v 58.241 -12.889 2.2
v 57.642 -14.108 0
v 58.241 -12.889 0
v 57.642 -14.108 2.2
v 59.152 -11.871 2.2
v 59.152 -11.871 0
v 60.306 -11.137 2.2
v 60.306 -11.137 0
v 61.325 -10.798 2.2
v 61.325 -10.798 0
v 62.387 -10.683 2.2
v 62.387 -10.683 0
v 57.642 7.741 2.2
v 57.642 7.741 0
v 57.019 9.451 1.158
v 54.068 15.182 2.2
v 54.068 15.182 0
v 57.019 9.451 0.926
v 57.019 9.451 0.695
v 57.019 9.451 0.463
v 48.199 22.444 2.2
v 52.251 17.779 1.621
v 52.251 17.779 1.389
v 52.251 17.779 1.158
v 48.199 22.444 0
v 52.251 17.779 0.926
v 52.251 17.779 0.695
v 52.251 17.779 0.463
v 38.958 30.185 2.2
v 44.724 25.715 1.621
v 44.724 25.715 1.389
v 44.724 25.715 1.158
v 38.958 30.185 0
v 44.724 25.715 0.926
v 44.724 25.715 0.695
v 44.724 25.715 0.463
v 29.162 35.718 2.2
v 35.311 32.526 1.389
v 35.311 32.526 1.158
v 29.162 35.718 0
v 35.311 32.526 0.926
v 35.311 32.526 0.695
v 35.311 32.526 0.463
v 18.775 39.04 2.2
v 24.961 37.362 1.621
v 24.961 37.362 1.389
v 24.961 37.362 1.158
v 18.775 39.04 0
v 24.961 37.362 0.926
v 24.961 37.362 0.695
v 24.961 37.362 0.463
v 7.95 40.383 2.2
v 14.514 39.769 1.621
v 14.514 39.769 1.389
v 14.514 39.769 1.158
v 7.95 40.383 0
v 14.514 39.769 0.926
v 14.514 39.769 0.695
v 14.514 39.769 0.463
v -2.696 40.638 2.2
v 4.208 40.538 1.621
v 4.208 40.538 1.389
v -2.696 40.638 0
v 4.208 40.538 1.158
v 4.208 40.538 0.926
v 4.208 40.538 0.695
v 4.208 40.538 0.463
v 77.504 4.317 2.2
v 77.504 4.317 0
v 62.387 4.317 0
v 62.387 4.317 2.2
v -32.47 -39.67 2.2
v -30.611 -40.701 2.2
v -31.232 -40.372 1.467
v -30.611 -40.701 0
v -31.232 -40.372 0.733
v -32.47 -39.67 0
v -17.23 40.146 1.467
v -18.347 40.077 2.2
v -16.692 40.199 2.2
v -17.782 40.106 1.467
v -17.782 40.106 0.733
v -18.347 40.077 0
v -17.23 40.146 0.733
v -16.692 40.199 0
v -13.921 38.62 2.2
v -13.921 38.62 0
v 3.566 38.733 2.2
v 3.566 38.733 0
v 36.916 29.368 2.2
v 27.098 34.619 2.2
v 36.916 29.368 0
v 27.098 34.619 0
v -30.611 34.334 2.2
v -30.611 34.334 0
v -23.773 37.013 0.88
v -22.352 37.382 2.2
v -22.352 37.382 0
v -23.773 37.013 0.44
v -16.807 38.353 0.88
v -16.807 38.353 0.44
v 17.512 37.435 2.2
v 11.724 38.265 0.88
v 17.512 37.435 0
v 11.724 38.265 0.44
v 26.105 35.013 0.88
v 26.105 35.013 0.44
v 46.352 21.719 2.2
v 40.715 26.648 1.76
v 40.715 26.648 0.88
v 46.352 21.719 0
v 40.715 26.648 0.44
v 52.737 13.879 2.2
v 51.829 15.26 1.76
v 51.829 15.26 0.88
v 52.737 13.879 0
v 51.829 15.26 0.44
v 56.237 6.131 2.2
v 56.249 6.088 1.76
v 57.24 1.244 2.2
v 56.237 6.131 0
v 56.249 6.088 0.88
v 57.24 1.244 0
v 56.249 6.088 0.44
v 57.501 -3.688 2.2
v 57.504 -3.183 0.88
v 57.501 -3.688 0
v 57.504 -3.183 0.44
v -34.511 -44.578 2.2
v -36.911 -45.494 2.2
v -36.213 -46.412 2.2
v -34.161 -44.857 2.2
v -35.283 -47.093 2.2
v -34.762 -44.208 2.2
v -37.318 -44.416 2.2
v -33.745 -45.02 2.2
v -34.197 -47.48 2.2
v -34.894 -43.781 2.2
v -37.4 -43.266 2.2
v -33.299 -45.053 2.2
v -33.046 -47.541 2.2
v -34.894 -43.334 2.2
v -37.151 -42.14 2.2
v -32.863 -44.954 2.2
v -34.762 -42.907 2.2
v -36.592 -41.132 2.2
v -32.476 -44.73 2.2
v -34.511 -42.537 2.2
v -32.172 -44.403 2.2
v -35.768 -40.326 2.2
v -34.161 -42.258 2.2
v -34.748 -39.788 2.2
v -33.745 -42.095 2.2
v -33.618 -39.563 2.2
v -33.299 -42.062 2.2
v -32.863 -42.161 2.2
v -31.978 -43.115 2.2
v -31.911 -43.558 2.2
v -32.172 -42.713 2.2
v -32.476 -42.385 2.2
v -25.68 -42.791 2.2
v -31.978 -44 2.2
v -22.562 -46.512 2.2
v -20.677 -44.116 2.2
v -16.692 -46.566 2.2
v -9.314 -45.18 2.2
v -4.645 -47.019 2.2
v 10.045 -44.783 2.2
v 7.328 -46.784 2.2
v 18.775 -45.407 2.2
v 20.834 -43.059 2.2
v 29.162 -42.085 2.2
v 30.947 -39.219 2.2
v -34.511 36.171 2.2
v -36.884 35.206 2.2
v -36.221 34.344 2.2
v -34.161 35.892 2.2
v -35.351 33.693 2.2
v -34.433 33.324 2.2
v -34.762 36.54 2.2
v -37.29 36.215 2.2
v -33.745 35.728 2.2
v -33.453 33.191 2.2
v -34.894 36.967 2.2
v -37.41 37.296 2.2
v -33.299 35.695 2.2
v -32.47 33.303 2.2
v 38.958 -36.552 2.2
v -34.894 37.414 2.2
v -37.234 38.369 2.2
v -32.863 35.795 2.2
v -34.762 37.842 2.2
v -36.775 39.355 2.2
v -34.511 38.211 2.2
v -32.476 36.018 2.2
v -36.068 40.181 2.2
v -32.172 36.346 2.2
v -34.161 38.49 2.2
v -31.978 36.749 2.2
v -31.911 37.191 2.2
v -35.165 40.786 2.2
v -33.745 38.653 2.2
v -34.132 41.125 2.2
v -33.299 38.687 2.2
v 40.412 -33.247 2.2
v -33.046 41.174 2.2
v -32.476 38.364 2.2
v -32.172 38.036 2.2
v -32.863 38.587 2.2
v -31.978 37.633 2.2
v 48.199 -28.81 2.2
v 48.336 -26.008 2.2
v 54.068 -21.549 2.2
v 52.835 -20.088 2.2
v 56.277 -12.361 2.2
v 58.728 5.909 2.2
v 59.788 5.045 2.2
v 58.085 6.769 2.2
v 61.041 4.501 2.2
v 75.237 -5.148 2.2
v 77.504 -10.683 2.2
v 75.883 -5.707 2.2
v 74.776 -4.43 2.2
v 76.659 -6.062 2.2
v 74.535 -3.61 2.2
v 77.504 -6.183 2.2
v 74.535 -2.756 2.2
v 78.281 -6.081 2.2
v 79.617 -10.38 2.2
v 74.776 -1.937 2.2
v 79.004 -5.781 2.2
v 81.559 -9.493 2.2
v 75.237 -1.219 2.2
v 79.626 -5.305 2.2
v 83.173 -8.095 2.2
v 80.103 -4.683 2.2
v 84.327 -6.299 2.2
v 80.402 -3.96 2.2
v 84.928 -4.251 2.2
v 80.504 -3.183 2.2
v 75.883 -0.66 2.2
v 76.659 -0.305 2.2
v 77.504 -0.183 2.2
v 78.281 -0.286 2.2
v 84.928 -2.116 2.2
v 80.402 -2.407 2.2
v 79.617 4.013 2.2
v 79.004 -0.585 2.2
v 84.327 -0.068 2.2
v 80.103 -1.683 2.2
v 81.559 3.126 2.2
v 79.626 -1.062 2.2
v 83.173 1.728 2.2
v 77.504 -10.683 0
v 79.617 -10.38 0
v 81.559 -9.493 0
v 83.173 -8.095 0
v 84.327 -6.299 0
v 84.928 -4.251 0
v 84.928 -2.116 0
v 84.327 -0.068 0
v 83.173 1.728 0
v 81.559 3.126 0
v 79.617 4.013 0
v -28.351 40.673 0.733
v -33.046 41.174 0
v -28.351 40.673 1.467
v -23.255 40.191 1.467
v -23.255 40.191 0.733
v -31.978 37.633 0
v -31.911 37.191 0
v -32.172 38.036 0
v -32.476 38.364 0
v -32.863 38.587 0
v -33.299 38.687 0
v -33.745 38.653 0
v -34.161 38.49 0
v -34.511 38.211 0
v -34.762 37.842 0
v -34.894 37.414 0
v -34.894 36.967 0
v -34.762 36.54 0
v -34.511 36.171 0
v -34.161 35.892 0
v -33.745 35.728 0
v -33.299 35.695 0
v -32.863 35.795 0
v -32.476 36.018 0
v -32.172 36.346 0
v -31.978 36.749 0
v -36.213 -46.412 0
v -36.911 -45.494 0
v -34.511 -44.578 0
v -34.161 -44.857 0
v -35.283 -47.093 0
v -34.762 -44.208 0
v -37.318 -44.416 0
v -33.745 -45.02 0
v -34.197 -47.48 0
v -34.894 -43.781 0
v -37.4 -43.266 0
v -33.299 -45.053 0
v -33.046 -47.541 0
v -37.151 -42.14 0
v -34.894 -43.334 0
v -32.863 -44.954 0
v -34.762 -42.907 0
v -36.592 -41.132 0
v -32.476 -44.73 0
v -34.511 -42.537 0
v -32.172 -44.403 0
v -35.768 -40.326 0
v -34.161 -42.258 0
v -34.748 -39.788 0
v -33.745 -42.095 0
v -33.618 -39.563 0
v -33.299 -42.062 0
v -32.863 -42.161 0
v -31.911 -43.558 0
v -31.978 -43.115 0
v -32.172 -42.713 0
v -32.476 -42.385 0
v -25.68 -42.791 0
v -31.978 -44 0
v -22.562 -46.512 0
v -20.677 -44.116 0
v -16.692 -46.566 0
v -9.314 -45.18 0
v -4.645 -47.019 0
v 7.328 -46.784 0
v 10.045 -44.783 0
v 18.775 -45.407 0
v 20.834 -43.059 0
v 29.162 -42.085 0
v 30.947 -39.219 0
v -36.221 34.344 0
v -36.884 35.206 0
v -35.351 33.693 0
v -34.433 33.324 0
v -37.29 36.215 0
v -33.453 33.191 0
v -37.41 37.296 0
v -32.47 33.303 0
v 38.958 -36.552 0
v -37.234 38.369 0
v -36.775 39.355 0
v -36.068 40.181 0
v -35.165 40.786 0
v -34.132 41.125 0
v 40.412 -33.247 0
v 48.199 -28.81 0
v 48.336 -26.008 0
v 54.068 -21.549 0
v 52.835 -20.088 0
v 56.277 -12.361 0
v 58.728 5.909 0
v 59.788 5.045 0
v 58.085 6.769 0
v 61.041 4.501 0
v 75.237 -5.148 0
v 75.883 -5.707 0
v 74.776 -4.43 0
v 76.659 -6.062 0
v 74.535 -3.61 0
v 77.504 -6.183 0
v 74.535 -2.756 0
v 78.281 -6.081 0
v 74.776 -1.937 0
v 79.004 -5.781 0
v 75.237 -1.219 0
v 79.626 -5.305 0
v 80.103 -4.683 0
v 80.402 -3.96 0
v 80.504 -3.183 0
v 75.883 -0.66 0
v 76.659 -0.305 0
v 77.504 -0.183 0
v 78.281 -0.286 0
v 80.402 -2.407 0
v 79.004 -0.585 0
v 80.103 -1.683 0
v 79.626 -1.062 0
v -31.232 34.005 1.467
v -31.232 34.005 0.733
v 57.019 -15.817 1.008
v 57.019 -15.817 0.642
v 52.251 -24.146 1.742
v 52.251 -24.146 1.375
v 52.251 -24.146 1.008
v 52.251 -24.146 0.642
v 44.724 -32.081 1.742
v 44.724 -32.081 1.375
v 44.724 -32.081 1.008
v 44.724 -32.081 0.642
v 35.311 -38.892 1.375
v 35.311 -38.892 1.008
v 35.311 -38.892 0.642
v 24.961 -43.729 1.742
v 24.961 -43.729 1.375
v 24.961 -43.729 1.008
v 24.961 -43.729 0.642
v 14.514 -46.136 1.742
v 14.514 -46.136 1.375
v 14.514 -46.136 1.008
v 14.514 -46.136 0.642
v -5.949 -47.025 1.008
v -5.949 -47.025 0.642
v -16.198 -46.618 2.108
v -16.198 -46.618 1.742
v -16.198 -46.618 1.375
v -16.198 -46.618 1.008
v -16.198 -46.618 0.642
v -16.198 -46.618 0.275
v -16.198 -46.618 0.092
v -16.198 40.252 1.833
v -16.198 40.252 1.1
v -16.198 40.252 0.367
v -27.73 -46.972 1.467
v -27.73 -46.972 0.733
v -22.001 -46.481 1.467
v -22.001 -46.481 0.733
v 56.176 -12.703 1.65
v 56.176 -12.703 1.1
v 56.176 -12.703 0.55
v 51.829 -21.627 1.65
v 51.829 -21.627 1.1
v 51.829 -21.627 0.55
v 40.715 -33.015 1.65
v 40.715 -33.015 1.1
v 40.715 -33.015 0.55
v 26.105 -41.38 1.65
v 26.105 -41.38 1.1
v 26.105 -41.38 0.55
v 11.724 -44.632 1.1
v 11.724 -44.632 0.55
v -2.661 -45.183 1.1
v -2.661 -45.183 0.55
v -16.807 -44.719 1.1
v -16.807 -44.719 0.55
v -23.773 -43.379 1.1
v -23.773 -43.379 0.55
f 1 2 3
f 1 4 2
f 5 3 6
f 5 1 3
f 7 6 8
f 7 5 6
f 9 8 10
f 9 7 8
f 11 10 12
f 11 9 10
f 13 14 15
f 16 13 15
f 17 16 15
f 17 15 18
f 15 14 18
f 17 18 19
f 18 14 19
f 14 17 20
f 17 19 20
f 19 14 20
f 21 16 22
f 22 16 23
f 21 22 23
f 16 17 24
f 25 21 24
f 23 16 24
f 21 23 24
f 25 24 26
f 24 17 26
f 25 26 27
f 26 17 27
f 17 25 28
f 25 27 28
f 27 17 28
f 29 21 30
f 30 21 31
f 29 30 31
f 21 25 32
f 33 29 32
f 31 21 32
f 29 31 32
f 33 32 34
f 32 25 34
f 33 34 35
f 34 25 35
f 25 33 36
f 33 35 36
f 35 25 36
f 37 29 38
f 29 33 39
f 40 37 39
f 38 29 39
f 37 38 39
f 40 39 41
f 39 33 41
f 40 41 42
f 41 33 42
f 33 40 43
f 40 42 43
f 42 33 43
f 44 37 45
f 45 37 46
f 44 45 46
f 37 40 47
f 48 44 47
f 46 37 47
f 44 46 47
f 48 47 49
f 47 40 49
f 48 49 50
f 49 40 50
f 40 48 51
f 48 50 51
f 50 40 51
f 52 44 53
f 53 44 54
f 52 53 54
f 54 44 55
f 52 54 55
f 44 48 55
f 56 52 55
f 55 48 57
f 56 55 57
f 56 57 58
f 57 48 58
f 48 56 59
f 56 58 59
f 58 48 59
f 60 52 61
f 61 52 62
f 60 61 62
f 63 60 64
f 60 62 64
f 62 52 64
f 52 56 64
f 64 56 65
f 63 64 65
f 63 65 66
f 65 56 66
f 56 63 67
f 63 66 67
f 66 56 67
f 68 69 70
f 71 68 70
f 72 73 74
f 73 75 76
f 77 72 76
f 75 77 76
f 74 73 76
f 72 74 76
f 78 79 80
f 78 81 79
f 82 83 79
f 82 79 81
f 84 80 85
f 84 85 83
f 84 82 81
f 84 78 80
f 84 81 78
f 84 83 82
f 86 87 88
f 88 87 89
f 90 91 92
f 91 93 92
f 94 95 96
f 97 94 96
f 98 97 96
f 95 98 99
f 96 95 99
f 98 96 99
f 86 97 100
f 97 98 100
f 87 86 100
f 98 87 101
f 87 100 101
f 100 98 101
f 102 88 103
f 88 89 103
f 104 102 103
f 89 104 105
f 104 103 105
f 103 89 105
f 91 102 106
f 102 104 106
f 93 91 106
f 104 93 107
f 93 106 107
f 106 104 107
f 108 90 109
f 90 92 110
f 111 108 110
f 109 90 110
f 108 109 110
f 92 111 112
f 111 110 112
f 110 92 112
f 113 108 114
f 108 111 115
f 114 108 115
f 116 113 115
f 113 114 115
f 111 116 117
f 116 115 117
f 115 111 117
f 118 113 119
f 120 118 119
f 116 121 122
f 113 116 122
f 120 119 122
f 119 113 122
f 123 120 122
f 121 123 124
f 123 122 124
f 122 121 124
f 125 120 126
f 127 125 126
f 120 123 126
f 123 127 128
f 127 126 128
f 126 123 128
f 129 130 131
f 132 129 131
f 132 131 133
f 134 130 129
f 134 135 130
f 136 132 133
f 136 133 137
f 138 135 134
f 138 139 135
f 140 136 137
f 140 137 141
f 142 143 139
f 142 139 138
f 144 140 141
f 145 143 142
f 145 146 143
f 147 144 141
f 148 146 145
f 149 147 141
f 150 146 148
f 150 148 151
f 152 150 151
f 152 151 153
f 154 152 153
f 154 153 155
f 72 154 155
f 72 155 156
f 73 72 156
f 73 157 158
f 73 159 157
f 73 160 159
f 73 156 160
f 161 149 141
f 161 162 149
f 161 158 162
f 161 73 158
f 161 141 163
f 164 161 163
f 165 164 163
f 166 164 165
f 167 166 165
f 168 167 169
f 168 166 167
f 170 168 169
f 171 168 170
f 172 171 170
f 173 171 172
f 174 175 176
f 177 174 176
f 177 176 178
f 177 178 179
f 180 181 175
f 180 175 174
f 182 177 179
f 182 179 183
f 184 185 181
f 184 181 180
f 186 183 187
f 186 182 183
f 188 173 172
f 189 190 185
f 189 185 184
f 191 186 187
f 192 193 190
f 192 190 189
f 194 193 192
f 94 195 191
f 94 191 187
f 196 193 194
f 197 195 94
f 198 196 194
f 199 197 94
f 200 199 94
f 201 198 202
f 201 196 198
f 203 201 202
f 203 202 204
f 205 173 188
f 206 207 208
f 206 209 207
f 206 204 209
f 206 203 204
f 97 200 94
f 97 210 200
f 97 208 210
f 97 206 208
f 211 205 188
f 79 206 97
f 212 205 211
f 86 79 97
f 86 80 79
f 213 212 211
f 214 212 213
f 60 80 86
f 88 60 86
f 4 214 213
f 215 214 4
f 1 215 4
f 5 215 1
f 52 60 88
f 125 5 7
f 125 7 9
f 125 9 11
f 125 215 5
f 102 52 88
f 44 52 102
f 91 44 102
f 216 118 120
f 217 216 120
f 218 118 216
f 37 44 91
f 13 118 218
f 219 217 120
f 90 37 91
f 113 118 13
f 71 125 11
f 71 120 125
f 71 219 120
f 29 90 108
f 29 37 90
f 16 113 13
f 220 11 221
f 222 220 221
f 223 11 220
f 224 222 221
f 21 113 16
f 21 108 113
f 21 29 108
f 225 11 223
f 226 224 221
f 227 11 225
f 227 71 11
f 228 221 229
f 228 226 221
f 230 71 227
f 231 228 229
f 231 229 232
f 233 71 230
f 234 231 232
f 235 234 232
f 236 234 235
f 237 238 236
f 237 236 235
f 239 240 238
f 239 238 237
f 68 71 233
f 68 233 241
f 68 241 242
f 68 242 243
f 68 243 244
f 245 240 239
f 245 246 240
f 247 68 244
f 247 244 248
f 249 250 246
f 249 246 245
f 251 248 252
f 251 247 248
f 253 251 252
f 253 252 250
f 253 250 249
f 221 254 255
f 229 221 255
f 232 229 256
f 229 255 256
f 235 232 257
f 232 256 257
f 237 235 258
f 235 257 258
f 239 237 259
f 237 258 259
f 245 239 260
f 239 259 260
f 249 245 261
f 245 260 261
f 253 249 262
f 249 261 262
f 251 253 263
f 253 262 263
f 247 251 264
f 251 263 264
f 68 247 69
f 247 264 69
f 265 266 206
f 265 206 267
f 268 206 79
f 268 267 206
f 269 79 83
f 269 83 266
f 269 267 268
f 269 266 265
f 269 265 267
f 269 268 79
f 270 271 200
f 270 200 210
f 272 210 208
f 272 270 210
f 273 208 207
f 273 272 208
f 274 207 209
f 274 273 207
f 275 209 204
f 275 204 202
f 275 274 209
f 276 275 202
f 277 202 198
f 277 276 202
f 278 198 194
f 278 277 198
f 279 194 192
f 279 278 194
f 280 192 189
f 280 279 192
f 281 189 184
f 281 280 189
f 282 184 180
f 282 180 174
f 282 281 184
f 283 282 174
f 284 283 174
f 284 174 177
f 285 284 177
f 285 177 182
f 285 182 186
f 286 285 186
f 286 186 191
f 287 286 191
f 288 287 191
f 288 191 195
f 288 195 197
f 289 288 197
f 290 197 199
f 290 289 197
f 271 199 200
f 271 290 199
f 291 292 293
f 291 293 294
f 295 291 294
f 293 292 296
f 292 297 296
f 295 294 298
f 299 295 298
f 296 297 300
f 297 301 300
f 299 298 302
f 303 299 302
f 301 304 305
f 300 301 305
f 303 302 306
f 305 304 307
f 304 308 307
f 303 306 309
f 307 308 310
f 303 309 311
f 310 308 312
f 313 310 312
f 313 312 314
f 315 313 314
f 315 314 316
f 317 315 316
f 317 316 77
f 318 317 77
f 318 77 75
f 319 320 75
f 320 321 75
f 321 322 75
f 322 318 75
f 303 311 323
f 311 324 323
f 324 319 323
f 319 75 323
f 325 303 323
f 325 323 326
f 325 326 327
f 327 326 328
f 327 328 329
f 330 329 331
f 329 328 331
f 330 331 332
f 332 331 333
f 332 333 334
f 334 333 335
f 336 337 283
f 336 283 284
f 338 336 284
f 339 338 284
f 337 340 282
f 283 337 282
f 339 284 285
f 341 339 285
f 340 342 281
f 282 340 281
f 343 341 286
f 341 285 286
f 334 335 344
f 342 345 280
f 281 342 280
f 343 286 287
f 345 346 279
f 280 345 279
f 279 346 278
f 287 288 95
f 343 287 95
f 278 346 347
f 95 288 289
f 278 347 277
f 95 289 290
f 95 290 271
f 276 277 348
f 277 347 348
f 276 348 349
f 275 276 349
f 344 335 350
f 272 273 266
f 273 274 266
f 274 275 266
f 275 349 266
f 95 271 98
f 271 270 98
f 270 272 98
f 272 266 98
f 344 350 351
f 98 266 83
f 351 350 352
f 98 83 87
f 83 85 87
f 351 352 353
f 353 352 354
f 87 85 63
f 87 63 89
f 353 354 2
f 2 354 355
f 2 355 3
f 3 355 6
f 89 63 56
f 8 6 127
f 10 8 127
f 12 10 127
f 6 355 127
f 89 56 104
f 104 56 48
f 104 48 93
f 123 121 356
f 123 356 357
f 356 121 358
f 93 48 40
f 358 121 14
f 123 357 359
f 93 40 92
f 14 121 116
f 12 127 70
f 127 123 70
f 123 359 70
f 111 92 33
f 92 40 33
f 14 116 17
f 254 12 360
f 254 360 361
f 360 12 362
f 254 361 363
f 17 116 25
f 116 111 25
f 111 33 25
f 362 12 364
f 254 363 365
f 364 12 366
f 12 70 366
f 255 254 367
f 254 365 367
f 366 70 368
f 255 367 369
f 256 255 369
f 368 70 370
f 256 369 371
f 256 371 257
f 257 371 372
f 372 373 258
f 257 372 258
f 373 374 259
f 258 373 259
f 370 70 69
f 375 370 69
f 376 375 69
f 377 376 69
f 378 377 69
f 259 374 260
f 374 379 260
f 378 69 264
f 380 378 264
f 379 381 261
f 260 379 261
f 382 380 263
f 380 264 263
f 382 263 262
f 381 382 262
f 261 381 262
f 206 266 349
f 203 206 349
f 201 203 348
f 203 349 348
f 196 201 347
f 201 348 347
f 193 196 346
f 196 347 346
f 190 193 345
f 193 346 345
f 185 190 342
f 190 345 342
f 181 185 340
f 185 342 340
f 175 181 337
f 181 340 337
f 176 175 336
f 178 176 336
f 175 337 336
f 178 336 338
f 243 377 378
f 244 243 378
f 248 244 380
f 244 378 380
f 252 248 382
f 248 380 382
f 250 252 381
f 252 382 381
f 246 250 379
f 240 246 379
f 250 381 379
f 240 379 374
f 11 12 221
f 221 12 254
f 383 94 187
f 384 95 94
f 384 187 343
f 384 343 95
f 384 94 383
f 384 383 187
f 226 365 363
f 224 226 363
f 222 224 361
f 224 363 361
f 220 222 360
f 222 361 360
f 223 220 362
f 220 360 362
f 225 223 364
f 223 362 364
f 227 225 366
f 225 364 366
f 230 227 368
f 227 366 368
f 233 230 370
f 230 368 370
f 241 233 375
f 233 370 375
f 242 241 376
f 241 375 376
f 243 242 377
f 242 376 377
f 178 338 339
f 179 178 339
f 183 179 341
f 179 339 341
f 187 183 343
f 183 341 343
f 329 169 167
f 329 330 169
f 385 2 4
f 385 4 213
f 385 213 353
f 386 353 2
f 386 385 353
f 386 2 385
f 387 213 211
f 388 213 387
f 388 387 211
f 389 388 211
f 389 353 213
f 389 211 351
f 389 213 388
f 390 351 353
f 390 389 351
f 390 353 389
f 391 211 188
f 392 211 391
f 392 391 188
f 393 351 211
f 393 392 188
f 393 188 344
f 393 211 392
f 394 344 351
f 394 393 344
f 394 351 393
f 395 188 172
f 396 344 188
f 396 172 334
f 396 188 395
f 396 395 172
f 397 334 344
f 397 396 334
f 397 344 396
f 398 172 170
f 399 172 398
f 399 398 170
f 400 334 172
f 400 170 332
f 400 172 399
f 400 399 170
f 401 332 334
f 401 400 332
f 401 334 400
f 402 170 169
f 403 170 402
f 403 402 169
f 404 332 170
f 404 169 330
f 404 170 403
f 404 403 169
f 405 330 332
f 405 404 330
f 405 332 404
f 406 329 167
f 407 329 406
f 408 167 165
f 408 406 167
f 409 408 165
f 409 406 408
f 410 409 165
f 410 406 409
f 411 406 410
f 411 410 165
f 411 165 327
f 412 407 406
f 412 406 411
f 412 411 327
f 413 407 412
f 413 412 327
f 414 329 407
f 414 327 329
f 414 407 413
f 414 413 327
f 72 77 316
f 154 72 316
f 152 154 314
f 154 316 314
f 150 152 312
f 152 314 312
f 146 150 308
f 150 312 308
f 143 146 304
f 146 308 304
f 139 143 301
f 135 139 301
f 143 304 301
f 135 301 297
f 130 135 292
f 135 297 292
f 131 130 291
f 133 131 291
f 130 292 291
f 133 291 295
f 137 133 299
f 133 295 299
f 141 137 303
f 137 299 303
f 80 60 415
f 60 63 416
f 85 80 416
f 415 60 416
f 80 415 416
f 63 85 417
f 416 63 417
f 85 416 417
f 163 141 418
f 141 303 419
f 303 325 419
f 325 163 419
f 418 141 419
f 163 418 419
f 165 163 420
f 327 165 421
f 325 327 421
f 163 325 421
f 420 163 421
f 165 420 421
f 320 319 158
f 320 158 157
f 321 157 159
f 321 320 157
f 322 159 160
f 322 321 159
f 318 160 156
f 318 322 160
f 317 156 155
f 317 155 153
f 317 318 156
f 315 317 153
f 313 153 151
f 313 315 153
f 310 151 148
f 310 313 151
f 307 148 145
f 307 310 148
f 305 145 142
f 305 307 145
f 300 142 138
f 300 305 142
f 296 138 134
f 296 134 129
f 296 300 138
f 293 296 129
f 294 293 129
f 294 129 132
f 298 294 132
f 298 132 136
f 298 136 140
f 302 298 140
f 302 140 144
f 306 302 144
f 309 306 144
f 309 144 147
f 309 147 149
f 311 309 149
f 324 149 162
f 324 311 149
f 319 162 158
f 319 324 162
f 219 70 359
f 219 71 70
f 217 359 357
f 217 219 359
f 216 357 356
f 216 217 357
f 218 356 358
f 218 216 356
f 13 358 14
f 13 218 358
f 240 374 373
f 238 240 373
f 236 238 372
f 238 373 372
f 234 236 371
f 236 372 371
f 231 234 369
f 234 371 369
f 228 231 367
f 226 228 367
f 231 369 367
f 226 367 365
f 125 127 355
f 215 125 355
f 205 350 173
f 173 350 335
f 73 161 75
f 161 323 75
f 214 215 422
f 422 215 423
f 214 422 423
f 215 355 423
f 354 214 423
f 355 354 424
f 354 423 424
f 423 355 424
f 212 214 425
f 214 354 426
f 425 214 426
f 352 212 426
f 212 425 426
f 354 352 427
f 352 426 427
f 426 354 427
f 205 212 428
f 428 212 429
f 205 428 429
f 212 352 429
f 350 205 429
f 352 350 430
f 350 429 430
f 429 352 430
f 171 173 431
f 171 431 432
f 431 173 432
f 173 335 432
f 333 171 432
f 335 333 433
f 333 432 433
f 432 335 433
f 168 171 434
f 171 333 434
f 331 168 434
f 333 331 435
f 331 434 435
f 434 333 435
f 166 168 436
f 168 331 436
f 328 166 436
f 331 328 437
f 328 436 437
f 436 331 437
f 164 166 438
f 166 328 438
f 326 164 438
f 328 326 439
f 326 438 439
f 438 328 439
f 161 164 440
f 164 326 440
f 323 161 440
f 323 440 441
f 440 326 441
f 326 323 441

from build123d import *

# Parameters (mm, degrees)
F0_R     = 1.5
F1_DEPTH = 2.2
F2_R     = 5


# Not quite as in the source:
# - ends of sketch curves that miss each other by under 0.0002 mm in the source are joined
# - the dataset's text gives a spline's control points without its knots; the knots are read off the source's solid


with BuildPart() as f1:
    # F0 (on Top) → F1 (new body)
    with BuildSketch(Plane.XY):
        with BuildLine():
            add(Edge.make_bspline(
                [(-30.6111583346, -40.7008057443), (-31.233077321, -40.3790771173), (-31.8528544001, -40.0346551051), (-32.469697118, -39.6698600783)],
                knots=[0.6865550694, 0.6865550694, 0.6865550694, 0.6865550694, 0.698673585, 0.698673585, 0.698673585, 0.698673585], degree=3))
            ThreePointArc((-32.469697118, -39.6698600783), (-37.400344821, -43.2656468064), (-33.0455697059, -47.5407962381))
            add(Edge.make_bspline(
                [(-33.0455697059, -47.5407962381), (-28.2150059427, -47.0976245157), (-21.512714319, -46.0289871022), (-16.6916312134, -46.5655575872)],
                knots=[0, 0, 0, 0, 16.3829910165, 16.3829910165, 16.3829910165, 16.3829910165], degree=3))
            add(Edge.make_bspline(
                [(58.5705779891, -10.6833517733), (58.5045966245, -10.9937274451), (58.1139682264, -12.7078835649), (57.1321161632, -15.8212976201), (55.4627512009, -19.3062888881), (53.7559729129, -22.0784311932), (51.7889797877, -24.8398815578), (48.8824684734, -28.233839645), (44.8027944584, -32.1279022255), (40.2521320917, -35.7428568059), (35.3501612154, -38.9743729453), (31.0709874957, -41.2568133399), (27.5873440069, -42.7817363934), (24.0850094319, -44.0818391055), (19.7200729084, -45.2896051132), (14.5079732054, -46.2040279233), (9.333650913, -46.7087635295), (5.0560116744, -46.8940848045), (1.6559105615, -46.9634870038), (-0.8844247603, -46.9908203291), (-3.4095063019, -47.0107743311), (-5.9465324466, -47.0289364293), (-8.4959599535, -47.0211705077), (-11.9085350935, -46.9496883405), (-14.6448180595, -46.7853276586), (-16.5270909923, -46.5838707043), (-16.6916312134, -46.5655575872)],
                knots=[0.0555924477, 0.0555924477, 0.0555924477, 0.0555924477, 0.0625, 0.09375, 0.125, 0.140625, 0.15625, 0.1875, 0.21875, 0.25, 0.28125, 0.3125, 0.328125, 0.34375, 0.375, 0.40625, 0.4375, 0.46875, 0.484375, 0.5, 0.515625, 0.53125, 0.546875, 0.5625, 0.59375, 0.5967429767, 0.5967429767, 0.5967429767, 0.5967429767], degree=3))
            Line((58.5705779891, -10.6833517733), (77.5044386559, -10.6833535796))
            ThreePointArc((77.5044386559, -10.6833535796), (85.0044386559, -3.1833535796), (77.5044386559, 4.3166464204))
            Line((77.5044386559, 4.3166464204), (58.6926016813, 4.3166464204))
            add(Edge.make_bspline(
                [(59.3254850017, -3.1833535832), (60.0342853265, -2.7966780854), (58.8687853693, -1.6734940692), (59.3856047623, 0.8985285026), (58.9622009071, 3.1879456463), (58.6926016813, 4.3166464204)],
                knots=[0, 0, 0, 0, 0.0130384822, 0.0314878463, 0.049315333, 0.049315333, 0.049315333, 0.049315333], degree=3))
            add(Edge.make_bspline(
                [(57.5012365496, -3.6881837366), (58.3665907715, -3.5375700684), (58.9841699395, -3.3695529499), (59.3254850017, -3.1833535832)],
                knots=[0.9937214612, 0.9937214612, 0.9937214612, 0.9937214612, 1, 1, 1, 1], degree=3))
            add(Edge.make_bspline(
                [(57.5012365496, -3.6881837366), (57.4239325318, -9.7536818174), (53.9530648244, -23.5829729529), (26.6651894068, -45.0062374143), (-2.5492473673, -45.1539383898), (-21.5965397706, -45.3642119383), (-30.6111583346, -40.7008057443)],
                knots=[0.0039126122, 0.0039126122, 0.0039126122, 0.0039126122, 0.1450305925, 0.333052663, 0.5108990784, 0.6865550694, 0.6865550694, 0.6865550694, 0.6865550694], degree=3))
        make_face()
        with Locations((-33.4110080981, -43.5575243692)):
            Circle(F0_R, mode=Mode.SUBTRACT)
        with BuildLine():
            ThreePointArc((77.5044386559, -6.1833535796), (74.5044386559, -3.1833535796), (77.5044386559, -0.1833535796))
            ThreePointArc((77.5044386559, -0.1833535796), (79.6257589995, -1.062033236), (80.5044386559, -3.1833535796))
            ThreePointArc((80.5044386559, -3.1833535796), (79.6257589995, -5.3046739232), (77.5044386559, -6.1833535796))
        make_face(mode=Mode.SUBTRACT)
        with BuildLine():
            ThreePointArc((-35.3506780872, 33.692577605), (-33.9468187682, 33.2268662862), (-32.469697118, 33.3031529191))
            add(Edge.make_bspline(
                [(-30.6111583346, 34.3340985851), (-31.233077321, 34.0123699581), (-31.8528544001, 33.6679479459), (-32.469697118, 33.3031529191)],
                knots=[0.6865550694, 0.6865550694, 0.6865550694, 0.6865550694, 0.698673585, 0.698673585, 0.698673585, 0.698673585], degree=3))
            add(Edge.make_bspline(
                [(57.5044386559, -3.1833535796), (57.5044386559, 3.0581977794), (54.1636559986, 17.0509341089), (26.6651894068, 38.6395302551), (-2.5492473673, 38.7872312306), (-21.5965397706, 38.9975047791), (-30.6111583346, 34.3340985851)],
                knots=[0, 0, 0, 0, 0.1450305925, 0.333052663, 0.5108990784, 0.6865550694, 0.6865550694, 0.6865550694, 0.6865550694], degree=3))
            add(Edge.make_bspline(
                [(57.5044386559, -3.1833535796), (57.5044386559, -3.3517371584), (57.5033798672, -3.5200128066), (57.5012365496, -3.6881837366)],
                knots=[0, 0, 0, 0, 0.0039126122, 0.0039126122, 0.0039126122, 0.0039126122], degree=3))
            add(Edge.make_bspline(
                [(57.5012365496, -3.6881837366), (58.3665907715, -3.5375700684), (58.9841699395, -3.3695529499), (59.3254850017, -3.1833535832)],
                knots=[0.9937214612, 0.9937214612, 0.9937214612, 0.9937214612, 1, 1, 1, 1], degree=3))
            add(Edge.make_bspline(
                [(59.3254850017, -3.1833535832), (60.0342853265, -2.7966780854), (58.8687853693, -1.6734940692), (59.3856047623, 0.8985285026), (58.9622009071, 3.1879456463), (58.6926016813, 4.3166464204)],
                knots=[0, 0, 0, 0, 0.0130384822, 0.0314878463, 0.049315333, 0.049315333, 0.049315333, 0.049315333], degree=3))
            Line((58.6926016813, 4.3166464204), (58.5705864982, 4.3166464204))
            add(Edge.make_bspline(
                [(58.5705864982, 4.3166464204), (58.5045966245, 4.6270202787), (58.1139682264, 6.3411763984), (57.1321161632, 9.4545904537), (55.4627512009, 12.9395817217), (53.7559729129, 15.7117240268), (51.7889797877, 18.4731743913), (48.8824684734, 21.8671324785), (44.8027944584, 25.7611950591), (40.2521320917, 29.3761496394), (35.3501612154, 32.6076657789), (31.0709874957, 34.8901061735), (27.5873440069, 36.4150292269), (24.0850094319, 37.7151319391), (19.7200729084, 38.9228979468), (14.5079732054, 39.8373207569), (9.333650913, 40.3420563631), (5.0560116744, 40.5273776381), (1.6559105615, 40.5967798374), (-0.6449427019, 40.6215364001), (-2.0915209967, 40.6335552581), (-2.6960509898, 40.6382858746)],
                knots=[0.0555924477, 0.0555924477, 0.0555924477, 0.0555924477, 0.0625, 0.09375, 0.125, 0.140625, 0.15625, 0.1875, 0.21875, 0.25, 0.28125, 0.3125, 0.328125, 0.34375, 0.375, 0.40625, 0.4375, 0.46875, 0.484375, 0.5, 0.511206008, 0.511206008, 0.511206008, 0.511206008], degree=3))
            add(Edge.make_bspline(
                [(-2.6960509898, 40.6382858746), (-2.9344421468, 40.6401513521), (-4.0160115872, 40.6484090232), (-5.9465324466, 40.6622292629), (-8.4959599535, 40.6544633413), (-11.9085350935, 40.5829811741), (-14.6448180595, 40.4186204922), (-16.5270909923, 40.2171635379), (-16.6916314281, 40.1988523389)],
                knots=[0.511206008, 0.511206008, 0.511206008, 0.511206008, 0.515625, 0.53125, 0.546875, 0.5625, 0.59375, 0.5967429767, 0.5967429767, 0.5967429767, 0.5967429767], degree=3))
            add(Edge.make_bspline(
                [(-18.3474642287, 40.0770180524), (-17.7760545185, 40.1001547528), (-17.2224405061, 40.1397731224), (-16.6916314281, 40.1988523389)],
                knots=[14.5791963744, 14.5791963744, 14.5791963744, 14.5791963744, 16.3829910165, 16.3829910165, 16.3829910165, 16.3829910165], degree=3))
            add(Edge.make_bspline(
                [(-18.3474642287, 40.0770180524), (-19.3628733695, 39.9392326528), (-22.0032579926, 39.5041891519), (-25.5922390173, 38.5279804037), (-29.0379906327, 37.1641344821), (-31.629223055, 35.9417528172), (-33.6064465264, 34.8002248895), (-34.9272694884, 33.9676196507), (-35.3506780872, 33.692577605)],
                knots=[0.5489272334, 0.5489272334, 0.5489272334, 0.5489272334, 0.5635582322, 0.5867417108, 0.6077658408, 0.6262201744, 0.6449115004, 0.6534319228, 0.6534319228, 0.6534319228, 0.6534319228], degree=3))
        make_face()
        with BuildLine():
            ThreePointArc((-33.0455697059, 41.1740890789), (-37.2336779457, 38.368609737), (-35.3506780872, 33.692577605))
            add(Edge.make_bspline(
                [(-18.3474642287, 40.0770180524), (-19.3628733695, 39.9392326528), (-22.0032579926, 39.5041891519), (-25.5922390173, 38.5279804037), (-29.0379906327, 37.1641344821), (-31.629223055, 35.9417528172), (-33.6064465264, 34.8002248895), (-34.9272694884, 33.9676196507), (-35.3506780872, 33.692577605)],
                knots=[0.5489272334, 0.5489272334, 0.5489272334, 0.5489272334, 0.5635582322, 0.5867417108, 0.6077658408, 0.6262201744, 0.6449115004, 0.6534319228, 0.6534319228, 0.6534319228, 0.6534319228], degree=3))
            add(Edge.make_bspline(
                [(-33.0455697059, 41.1740890789), (-28.7468590717, 40.7797113024), (-22.9658915055, 39.8900153359), (-18.3474642287, 40.0770180524)],
                knots=[0, 0, 0, 0, 14.5791963744, 14.5791963744, 14.5791963744, 14.5791963744], degree=3))
        make_face()
        with Locations((-33.4110080981, 37.19081721)):
            Circle(F0_R, mode=Mode.SUBTRACT)
    extrude(amount=F1_DEPTH)

    # F2
    f2_edges = [f1.edges().sort_by_distance(p)[0] for p in [
        (58.570578, -10.683352, 1.1),
        (58.570586, 4.316646, 1.1),
    ]]
    fillet(f2_edges, radius=F2_R)


solid = f1.part
